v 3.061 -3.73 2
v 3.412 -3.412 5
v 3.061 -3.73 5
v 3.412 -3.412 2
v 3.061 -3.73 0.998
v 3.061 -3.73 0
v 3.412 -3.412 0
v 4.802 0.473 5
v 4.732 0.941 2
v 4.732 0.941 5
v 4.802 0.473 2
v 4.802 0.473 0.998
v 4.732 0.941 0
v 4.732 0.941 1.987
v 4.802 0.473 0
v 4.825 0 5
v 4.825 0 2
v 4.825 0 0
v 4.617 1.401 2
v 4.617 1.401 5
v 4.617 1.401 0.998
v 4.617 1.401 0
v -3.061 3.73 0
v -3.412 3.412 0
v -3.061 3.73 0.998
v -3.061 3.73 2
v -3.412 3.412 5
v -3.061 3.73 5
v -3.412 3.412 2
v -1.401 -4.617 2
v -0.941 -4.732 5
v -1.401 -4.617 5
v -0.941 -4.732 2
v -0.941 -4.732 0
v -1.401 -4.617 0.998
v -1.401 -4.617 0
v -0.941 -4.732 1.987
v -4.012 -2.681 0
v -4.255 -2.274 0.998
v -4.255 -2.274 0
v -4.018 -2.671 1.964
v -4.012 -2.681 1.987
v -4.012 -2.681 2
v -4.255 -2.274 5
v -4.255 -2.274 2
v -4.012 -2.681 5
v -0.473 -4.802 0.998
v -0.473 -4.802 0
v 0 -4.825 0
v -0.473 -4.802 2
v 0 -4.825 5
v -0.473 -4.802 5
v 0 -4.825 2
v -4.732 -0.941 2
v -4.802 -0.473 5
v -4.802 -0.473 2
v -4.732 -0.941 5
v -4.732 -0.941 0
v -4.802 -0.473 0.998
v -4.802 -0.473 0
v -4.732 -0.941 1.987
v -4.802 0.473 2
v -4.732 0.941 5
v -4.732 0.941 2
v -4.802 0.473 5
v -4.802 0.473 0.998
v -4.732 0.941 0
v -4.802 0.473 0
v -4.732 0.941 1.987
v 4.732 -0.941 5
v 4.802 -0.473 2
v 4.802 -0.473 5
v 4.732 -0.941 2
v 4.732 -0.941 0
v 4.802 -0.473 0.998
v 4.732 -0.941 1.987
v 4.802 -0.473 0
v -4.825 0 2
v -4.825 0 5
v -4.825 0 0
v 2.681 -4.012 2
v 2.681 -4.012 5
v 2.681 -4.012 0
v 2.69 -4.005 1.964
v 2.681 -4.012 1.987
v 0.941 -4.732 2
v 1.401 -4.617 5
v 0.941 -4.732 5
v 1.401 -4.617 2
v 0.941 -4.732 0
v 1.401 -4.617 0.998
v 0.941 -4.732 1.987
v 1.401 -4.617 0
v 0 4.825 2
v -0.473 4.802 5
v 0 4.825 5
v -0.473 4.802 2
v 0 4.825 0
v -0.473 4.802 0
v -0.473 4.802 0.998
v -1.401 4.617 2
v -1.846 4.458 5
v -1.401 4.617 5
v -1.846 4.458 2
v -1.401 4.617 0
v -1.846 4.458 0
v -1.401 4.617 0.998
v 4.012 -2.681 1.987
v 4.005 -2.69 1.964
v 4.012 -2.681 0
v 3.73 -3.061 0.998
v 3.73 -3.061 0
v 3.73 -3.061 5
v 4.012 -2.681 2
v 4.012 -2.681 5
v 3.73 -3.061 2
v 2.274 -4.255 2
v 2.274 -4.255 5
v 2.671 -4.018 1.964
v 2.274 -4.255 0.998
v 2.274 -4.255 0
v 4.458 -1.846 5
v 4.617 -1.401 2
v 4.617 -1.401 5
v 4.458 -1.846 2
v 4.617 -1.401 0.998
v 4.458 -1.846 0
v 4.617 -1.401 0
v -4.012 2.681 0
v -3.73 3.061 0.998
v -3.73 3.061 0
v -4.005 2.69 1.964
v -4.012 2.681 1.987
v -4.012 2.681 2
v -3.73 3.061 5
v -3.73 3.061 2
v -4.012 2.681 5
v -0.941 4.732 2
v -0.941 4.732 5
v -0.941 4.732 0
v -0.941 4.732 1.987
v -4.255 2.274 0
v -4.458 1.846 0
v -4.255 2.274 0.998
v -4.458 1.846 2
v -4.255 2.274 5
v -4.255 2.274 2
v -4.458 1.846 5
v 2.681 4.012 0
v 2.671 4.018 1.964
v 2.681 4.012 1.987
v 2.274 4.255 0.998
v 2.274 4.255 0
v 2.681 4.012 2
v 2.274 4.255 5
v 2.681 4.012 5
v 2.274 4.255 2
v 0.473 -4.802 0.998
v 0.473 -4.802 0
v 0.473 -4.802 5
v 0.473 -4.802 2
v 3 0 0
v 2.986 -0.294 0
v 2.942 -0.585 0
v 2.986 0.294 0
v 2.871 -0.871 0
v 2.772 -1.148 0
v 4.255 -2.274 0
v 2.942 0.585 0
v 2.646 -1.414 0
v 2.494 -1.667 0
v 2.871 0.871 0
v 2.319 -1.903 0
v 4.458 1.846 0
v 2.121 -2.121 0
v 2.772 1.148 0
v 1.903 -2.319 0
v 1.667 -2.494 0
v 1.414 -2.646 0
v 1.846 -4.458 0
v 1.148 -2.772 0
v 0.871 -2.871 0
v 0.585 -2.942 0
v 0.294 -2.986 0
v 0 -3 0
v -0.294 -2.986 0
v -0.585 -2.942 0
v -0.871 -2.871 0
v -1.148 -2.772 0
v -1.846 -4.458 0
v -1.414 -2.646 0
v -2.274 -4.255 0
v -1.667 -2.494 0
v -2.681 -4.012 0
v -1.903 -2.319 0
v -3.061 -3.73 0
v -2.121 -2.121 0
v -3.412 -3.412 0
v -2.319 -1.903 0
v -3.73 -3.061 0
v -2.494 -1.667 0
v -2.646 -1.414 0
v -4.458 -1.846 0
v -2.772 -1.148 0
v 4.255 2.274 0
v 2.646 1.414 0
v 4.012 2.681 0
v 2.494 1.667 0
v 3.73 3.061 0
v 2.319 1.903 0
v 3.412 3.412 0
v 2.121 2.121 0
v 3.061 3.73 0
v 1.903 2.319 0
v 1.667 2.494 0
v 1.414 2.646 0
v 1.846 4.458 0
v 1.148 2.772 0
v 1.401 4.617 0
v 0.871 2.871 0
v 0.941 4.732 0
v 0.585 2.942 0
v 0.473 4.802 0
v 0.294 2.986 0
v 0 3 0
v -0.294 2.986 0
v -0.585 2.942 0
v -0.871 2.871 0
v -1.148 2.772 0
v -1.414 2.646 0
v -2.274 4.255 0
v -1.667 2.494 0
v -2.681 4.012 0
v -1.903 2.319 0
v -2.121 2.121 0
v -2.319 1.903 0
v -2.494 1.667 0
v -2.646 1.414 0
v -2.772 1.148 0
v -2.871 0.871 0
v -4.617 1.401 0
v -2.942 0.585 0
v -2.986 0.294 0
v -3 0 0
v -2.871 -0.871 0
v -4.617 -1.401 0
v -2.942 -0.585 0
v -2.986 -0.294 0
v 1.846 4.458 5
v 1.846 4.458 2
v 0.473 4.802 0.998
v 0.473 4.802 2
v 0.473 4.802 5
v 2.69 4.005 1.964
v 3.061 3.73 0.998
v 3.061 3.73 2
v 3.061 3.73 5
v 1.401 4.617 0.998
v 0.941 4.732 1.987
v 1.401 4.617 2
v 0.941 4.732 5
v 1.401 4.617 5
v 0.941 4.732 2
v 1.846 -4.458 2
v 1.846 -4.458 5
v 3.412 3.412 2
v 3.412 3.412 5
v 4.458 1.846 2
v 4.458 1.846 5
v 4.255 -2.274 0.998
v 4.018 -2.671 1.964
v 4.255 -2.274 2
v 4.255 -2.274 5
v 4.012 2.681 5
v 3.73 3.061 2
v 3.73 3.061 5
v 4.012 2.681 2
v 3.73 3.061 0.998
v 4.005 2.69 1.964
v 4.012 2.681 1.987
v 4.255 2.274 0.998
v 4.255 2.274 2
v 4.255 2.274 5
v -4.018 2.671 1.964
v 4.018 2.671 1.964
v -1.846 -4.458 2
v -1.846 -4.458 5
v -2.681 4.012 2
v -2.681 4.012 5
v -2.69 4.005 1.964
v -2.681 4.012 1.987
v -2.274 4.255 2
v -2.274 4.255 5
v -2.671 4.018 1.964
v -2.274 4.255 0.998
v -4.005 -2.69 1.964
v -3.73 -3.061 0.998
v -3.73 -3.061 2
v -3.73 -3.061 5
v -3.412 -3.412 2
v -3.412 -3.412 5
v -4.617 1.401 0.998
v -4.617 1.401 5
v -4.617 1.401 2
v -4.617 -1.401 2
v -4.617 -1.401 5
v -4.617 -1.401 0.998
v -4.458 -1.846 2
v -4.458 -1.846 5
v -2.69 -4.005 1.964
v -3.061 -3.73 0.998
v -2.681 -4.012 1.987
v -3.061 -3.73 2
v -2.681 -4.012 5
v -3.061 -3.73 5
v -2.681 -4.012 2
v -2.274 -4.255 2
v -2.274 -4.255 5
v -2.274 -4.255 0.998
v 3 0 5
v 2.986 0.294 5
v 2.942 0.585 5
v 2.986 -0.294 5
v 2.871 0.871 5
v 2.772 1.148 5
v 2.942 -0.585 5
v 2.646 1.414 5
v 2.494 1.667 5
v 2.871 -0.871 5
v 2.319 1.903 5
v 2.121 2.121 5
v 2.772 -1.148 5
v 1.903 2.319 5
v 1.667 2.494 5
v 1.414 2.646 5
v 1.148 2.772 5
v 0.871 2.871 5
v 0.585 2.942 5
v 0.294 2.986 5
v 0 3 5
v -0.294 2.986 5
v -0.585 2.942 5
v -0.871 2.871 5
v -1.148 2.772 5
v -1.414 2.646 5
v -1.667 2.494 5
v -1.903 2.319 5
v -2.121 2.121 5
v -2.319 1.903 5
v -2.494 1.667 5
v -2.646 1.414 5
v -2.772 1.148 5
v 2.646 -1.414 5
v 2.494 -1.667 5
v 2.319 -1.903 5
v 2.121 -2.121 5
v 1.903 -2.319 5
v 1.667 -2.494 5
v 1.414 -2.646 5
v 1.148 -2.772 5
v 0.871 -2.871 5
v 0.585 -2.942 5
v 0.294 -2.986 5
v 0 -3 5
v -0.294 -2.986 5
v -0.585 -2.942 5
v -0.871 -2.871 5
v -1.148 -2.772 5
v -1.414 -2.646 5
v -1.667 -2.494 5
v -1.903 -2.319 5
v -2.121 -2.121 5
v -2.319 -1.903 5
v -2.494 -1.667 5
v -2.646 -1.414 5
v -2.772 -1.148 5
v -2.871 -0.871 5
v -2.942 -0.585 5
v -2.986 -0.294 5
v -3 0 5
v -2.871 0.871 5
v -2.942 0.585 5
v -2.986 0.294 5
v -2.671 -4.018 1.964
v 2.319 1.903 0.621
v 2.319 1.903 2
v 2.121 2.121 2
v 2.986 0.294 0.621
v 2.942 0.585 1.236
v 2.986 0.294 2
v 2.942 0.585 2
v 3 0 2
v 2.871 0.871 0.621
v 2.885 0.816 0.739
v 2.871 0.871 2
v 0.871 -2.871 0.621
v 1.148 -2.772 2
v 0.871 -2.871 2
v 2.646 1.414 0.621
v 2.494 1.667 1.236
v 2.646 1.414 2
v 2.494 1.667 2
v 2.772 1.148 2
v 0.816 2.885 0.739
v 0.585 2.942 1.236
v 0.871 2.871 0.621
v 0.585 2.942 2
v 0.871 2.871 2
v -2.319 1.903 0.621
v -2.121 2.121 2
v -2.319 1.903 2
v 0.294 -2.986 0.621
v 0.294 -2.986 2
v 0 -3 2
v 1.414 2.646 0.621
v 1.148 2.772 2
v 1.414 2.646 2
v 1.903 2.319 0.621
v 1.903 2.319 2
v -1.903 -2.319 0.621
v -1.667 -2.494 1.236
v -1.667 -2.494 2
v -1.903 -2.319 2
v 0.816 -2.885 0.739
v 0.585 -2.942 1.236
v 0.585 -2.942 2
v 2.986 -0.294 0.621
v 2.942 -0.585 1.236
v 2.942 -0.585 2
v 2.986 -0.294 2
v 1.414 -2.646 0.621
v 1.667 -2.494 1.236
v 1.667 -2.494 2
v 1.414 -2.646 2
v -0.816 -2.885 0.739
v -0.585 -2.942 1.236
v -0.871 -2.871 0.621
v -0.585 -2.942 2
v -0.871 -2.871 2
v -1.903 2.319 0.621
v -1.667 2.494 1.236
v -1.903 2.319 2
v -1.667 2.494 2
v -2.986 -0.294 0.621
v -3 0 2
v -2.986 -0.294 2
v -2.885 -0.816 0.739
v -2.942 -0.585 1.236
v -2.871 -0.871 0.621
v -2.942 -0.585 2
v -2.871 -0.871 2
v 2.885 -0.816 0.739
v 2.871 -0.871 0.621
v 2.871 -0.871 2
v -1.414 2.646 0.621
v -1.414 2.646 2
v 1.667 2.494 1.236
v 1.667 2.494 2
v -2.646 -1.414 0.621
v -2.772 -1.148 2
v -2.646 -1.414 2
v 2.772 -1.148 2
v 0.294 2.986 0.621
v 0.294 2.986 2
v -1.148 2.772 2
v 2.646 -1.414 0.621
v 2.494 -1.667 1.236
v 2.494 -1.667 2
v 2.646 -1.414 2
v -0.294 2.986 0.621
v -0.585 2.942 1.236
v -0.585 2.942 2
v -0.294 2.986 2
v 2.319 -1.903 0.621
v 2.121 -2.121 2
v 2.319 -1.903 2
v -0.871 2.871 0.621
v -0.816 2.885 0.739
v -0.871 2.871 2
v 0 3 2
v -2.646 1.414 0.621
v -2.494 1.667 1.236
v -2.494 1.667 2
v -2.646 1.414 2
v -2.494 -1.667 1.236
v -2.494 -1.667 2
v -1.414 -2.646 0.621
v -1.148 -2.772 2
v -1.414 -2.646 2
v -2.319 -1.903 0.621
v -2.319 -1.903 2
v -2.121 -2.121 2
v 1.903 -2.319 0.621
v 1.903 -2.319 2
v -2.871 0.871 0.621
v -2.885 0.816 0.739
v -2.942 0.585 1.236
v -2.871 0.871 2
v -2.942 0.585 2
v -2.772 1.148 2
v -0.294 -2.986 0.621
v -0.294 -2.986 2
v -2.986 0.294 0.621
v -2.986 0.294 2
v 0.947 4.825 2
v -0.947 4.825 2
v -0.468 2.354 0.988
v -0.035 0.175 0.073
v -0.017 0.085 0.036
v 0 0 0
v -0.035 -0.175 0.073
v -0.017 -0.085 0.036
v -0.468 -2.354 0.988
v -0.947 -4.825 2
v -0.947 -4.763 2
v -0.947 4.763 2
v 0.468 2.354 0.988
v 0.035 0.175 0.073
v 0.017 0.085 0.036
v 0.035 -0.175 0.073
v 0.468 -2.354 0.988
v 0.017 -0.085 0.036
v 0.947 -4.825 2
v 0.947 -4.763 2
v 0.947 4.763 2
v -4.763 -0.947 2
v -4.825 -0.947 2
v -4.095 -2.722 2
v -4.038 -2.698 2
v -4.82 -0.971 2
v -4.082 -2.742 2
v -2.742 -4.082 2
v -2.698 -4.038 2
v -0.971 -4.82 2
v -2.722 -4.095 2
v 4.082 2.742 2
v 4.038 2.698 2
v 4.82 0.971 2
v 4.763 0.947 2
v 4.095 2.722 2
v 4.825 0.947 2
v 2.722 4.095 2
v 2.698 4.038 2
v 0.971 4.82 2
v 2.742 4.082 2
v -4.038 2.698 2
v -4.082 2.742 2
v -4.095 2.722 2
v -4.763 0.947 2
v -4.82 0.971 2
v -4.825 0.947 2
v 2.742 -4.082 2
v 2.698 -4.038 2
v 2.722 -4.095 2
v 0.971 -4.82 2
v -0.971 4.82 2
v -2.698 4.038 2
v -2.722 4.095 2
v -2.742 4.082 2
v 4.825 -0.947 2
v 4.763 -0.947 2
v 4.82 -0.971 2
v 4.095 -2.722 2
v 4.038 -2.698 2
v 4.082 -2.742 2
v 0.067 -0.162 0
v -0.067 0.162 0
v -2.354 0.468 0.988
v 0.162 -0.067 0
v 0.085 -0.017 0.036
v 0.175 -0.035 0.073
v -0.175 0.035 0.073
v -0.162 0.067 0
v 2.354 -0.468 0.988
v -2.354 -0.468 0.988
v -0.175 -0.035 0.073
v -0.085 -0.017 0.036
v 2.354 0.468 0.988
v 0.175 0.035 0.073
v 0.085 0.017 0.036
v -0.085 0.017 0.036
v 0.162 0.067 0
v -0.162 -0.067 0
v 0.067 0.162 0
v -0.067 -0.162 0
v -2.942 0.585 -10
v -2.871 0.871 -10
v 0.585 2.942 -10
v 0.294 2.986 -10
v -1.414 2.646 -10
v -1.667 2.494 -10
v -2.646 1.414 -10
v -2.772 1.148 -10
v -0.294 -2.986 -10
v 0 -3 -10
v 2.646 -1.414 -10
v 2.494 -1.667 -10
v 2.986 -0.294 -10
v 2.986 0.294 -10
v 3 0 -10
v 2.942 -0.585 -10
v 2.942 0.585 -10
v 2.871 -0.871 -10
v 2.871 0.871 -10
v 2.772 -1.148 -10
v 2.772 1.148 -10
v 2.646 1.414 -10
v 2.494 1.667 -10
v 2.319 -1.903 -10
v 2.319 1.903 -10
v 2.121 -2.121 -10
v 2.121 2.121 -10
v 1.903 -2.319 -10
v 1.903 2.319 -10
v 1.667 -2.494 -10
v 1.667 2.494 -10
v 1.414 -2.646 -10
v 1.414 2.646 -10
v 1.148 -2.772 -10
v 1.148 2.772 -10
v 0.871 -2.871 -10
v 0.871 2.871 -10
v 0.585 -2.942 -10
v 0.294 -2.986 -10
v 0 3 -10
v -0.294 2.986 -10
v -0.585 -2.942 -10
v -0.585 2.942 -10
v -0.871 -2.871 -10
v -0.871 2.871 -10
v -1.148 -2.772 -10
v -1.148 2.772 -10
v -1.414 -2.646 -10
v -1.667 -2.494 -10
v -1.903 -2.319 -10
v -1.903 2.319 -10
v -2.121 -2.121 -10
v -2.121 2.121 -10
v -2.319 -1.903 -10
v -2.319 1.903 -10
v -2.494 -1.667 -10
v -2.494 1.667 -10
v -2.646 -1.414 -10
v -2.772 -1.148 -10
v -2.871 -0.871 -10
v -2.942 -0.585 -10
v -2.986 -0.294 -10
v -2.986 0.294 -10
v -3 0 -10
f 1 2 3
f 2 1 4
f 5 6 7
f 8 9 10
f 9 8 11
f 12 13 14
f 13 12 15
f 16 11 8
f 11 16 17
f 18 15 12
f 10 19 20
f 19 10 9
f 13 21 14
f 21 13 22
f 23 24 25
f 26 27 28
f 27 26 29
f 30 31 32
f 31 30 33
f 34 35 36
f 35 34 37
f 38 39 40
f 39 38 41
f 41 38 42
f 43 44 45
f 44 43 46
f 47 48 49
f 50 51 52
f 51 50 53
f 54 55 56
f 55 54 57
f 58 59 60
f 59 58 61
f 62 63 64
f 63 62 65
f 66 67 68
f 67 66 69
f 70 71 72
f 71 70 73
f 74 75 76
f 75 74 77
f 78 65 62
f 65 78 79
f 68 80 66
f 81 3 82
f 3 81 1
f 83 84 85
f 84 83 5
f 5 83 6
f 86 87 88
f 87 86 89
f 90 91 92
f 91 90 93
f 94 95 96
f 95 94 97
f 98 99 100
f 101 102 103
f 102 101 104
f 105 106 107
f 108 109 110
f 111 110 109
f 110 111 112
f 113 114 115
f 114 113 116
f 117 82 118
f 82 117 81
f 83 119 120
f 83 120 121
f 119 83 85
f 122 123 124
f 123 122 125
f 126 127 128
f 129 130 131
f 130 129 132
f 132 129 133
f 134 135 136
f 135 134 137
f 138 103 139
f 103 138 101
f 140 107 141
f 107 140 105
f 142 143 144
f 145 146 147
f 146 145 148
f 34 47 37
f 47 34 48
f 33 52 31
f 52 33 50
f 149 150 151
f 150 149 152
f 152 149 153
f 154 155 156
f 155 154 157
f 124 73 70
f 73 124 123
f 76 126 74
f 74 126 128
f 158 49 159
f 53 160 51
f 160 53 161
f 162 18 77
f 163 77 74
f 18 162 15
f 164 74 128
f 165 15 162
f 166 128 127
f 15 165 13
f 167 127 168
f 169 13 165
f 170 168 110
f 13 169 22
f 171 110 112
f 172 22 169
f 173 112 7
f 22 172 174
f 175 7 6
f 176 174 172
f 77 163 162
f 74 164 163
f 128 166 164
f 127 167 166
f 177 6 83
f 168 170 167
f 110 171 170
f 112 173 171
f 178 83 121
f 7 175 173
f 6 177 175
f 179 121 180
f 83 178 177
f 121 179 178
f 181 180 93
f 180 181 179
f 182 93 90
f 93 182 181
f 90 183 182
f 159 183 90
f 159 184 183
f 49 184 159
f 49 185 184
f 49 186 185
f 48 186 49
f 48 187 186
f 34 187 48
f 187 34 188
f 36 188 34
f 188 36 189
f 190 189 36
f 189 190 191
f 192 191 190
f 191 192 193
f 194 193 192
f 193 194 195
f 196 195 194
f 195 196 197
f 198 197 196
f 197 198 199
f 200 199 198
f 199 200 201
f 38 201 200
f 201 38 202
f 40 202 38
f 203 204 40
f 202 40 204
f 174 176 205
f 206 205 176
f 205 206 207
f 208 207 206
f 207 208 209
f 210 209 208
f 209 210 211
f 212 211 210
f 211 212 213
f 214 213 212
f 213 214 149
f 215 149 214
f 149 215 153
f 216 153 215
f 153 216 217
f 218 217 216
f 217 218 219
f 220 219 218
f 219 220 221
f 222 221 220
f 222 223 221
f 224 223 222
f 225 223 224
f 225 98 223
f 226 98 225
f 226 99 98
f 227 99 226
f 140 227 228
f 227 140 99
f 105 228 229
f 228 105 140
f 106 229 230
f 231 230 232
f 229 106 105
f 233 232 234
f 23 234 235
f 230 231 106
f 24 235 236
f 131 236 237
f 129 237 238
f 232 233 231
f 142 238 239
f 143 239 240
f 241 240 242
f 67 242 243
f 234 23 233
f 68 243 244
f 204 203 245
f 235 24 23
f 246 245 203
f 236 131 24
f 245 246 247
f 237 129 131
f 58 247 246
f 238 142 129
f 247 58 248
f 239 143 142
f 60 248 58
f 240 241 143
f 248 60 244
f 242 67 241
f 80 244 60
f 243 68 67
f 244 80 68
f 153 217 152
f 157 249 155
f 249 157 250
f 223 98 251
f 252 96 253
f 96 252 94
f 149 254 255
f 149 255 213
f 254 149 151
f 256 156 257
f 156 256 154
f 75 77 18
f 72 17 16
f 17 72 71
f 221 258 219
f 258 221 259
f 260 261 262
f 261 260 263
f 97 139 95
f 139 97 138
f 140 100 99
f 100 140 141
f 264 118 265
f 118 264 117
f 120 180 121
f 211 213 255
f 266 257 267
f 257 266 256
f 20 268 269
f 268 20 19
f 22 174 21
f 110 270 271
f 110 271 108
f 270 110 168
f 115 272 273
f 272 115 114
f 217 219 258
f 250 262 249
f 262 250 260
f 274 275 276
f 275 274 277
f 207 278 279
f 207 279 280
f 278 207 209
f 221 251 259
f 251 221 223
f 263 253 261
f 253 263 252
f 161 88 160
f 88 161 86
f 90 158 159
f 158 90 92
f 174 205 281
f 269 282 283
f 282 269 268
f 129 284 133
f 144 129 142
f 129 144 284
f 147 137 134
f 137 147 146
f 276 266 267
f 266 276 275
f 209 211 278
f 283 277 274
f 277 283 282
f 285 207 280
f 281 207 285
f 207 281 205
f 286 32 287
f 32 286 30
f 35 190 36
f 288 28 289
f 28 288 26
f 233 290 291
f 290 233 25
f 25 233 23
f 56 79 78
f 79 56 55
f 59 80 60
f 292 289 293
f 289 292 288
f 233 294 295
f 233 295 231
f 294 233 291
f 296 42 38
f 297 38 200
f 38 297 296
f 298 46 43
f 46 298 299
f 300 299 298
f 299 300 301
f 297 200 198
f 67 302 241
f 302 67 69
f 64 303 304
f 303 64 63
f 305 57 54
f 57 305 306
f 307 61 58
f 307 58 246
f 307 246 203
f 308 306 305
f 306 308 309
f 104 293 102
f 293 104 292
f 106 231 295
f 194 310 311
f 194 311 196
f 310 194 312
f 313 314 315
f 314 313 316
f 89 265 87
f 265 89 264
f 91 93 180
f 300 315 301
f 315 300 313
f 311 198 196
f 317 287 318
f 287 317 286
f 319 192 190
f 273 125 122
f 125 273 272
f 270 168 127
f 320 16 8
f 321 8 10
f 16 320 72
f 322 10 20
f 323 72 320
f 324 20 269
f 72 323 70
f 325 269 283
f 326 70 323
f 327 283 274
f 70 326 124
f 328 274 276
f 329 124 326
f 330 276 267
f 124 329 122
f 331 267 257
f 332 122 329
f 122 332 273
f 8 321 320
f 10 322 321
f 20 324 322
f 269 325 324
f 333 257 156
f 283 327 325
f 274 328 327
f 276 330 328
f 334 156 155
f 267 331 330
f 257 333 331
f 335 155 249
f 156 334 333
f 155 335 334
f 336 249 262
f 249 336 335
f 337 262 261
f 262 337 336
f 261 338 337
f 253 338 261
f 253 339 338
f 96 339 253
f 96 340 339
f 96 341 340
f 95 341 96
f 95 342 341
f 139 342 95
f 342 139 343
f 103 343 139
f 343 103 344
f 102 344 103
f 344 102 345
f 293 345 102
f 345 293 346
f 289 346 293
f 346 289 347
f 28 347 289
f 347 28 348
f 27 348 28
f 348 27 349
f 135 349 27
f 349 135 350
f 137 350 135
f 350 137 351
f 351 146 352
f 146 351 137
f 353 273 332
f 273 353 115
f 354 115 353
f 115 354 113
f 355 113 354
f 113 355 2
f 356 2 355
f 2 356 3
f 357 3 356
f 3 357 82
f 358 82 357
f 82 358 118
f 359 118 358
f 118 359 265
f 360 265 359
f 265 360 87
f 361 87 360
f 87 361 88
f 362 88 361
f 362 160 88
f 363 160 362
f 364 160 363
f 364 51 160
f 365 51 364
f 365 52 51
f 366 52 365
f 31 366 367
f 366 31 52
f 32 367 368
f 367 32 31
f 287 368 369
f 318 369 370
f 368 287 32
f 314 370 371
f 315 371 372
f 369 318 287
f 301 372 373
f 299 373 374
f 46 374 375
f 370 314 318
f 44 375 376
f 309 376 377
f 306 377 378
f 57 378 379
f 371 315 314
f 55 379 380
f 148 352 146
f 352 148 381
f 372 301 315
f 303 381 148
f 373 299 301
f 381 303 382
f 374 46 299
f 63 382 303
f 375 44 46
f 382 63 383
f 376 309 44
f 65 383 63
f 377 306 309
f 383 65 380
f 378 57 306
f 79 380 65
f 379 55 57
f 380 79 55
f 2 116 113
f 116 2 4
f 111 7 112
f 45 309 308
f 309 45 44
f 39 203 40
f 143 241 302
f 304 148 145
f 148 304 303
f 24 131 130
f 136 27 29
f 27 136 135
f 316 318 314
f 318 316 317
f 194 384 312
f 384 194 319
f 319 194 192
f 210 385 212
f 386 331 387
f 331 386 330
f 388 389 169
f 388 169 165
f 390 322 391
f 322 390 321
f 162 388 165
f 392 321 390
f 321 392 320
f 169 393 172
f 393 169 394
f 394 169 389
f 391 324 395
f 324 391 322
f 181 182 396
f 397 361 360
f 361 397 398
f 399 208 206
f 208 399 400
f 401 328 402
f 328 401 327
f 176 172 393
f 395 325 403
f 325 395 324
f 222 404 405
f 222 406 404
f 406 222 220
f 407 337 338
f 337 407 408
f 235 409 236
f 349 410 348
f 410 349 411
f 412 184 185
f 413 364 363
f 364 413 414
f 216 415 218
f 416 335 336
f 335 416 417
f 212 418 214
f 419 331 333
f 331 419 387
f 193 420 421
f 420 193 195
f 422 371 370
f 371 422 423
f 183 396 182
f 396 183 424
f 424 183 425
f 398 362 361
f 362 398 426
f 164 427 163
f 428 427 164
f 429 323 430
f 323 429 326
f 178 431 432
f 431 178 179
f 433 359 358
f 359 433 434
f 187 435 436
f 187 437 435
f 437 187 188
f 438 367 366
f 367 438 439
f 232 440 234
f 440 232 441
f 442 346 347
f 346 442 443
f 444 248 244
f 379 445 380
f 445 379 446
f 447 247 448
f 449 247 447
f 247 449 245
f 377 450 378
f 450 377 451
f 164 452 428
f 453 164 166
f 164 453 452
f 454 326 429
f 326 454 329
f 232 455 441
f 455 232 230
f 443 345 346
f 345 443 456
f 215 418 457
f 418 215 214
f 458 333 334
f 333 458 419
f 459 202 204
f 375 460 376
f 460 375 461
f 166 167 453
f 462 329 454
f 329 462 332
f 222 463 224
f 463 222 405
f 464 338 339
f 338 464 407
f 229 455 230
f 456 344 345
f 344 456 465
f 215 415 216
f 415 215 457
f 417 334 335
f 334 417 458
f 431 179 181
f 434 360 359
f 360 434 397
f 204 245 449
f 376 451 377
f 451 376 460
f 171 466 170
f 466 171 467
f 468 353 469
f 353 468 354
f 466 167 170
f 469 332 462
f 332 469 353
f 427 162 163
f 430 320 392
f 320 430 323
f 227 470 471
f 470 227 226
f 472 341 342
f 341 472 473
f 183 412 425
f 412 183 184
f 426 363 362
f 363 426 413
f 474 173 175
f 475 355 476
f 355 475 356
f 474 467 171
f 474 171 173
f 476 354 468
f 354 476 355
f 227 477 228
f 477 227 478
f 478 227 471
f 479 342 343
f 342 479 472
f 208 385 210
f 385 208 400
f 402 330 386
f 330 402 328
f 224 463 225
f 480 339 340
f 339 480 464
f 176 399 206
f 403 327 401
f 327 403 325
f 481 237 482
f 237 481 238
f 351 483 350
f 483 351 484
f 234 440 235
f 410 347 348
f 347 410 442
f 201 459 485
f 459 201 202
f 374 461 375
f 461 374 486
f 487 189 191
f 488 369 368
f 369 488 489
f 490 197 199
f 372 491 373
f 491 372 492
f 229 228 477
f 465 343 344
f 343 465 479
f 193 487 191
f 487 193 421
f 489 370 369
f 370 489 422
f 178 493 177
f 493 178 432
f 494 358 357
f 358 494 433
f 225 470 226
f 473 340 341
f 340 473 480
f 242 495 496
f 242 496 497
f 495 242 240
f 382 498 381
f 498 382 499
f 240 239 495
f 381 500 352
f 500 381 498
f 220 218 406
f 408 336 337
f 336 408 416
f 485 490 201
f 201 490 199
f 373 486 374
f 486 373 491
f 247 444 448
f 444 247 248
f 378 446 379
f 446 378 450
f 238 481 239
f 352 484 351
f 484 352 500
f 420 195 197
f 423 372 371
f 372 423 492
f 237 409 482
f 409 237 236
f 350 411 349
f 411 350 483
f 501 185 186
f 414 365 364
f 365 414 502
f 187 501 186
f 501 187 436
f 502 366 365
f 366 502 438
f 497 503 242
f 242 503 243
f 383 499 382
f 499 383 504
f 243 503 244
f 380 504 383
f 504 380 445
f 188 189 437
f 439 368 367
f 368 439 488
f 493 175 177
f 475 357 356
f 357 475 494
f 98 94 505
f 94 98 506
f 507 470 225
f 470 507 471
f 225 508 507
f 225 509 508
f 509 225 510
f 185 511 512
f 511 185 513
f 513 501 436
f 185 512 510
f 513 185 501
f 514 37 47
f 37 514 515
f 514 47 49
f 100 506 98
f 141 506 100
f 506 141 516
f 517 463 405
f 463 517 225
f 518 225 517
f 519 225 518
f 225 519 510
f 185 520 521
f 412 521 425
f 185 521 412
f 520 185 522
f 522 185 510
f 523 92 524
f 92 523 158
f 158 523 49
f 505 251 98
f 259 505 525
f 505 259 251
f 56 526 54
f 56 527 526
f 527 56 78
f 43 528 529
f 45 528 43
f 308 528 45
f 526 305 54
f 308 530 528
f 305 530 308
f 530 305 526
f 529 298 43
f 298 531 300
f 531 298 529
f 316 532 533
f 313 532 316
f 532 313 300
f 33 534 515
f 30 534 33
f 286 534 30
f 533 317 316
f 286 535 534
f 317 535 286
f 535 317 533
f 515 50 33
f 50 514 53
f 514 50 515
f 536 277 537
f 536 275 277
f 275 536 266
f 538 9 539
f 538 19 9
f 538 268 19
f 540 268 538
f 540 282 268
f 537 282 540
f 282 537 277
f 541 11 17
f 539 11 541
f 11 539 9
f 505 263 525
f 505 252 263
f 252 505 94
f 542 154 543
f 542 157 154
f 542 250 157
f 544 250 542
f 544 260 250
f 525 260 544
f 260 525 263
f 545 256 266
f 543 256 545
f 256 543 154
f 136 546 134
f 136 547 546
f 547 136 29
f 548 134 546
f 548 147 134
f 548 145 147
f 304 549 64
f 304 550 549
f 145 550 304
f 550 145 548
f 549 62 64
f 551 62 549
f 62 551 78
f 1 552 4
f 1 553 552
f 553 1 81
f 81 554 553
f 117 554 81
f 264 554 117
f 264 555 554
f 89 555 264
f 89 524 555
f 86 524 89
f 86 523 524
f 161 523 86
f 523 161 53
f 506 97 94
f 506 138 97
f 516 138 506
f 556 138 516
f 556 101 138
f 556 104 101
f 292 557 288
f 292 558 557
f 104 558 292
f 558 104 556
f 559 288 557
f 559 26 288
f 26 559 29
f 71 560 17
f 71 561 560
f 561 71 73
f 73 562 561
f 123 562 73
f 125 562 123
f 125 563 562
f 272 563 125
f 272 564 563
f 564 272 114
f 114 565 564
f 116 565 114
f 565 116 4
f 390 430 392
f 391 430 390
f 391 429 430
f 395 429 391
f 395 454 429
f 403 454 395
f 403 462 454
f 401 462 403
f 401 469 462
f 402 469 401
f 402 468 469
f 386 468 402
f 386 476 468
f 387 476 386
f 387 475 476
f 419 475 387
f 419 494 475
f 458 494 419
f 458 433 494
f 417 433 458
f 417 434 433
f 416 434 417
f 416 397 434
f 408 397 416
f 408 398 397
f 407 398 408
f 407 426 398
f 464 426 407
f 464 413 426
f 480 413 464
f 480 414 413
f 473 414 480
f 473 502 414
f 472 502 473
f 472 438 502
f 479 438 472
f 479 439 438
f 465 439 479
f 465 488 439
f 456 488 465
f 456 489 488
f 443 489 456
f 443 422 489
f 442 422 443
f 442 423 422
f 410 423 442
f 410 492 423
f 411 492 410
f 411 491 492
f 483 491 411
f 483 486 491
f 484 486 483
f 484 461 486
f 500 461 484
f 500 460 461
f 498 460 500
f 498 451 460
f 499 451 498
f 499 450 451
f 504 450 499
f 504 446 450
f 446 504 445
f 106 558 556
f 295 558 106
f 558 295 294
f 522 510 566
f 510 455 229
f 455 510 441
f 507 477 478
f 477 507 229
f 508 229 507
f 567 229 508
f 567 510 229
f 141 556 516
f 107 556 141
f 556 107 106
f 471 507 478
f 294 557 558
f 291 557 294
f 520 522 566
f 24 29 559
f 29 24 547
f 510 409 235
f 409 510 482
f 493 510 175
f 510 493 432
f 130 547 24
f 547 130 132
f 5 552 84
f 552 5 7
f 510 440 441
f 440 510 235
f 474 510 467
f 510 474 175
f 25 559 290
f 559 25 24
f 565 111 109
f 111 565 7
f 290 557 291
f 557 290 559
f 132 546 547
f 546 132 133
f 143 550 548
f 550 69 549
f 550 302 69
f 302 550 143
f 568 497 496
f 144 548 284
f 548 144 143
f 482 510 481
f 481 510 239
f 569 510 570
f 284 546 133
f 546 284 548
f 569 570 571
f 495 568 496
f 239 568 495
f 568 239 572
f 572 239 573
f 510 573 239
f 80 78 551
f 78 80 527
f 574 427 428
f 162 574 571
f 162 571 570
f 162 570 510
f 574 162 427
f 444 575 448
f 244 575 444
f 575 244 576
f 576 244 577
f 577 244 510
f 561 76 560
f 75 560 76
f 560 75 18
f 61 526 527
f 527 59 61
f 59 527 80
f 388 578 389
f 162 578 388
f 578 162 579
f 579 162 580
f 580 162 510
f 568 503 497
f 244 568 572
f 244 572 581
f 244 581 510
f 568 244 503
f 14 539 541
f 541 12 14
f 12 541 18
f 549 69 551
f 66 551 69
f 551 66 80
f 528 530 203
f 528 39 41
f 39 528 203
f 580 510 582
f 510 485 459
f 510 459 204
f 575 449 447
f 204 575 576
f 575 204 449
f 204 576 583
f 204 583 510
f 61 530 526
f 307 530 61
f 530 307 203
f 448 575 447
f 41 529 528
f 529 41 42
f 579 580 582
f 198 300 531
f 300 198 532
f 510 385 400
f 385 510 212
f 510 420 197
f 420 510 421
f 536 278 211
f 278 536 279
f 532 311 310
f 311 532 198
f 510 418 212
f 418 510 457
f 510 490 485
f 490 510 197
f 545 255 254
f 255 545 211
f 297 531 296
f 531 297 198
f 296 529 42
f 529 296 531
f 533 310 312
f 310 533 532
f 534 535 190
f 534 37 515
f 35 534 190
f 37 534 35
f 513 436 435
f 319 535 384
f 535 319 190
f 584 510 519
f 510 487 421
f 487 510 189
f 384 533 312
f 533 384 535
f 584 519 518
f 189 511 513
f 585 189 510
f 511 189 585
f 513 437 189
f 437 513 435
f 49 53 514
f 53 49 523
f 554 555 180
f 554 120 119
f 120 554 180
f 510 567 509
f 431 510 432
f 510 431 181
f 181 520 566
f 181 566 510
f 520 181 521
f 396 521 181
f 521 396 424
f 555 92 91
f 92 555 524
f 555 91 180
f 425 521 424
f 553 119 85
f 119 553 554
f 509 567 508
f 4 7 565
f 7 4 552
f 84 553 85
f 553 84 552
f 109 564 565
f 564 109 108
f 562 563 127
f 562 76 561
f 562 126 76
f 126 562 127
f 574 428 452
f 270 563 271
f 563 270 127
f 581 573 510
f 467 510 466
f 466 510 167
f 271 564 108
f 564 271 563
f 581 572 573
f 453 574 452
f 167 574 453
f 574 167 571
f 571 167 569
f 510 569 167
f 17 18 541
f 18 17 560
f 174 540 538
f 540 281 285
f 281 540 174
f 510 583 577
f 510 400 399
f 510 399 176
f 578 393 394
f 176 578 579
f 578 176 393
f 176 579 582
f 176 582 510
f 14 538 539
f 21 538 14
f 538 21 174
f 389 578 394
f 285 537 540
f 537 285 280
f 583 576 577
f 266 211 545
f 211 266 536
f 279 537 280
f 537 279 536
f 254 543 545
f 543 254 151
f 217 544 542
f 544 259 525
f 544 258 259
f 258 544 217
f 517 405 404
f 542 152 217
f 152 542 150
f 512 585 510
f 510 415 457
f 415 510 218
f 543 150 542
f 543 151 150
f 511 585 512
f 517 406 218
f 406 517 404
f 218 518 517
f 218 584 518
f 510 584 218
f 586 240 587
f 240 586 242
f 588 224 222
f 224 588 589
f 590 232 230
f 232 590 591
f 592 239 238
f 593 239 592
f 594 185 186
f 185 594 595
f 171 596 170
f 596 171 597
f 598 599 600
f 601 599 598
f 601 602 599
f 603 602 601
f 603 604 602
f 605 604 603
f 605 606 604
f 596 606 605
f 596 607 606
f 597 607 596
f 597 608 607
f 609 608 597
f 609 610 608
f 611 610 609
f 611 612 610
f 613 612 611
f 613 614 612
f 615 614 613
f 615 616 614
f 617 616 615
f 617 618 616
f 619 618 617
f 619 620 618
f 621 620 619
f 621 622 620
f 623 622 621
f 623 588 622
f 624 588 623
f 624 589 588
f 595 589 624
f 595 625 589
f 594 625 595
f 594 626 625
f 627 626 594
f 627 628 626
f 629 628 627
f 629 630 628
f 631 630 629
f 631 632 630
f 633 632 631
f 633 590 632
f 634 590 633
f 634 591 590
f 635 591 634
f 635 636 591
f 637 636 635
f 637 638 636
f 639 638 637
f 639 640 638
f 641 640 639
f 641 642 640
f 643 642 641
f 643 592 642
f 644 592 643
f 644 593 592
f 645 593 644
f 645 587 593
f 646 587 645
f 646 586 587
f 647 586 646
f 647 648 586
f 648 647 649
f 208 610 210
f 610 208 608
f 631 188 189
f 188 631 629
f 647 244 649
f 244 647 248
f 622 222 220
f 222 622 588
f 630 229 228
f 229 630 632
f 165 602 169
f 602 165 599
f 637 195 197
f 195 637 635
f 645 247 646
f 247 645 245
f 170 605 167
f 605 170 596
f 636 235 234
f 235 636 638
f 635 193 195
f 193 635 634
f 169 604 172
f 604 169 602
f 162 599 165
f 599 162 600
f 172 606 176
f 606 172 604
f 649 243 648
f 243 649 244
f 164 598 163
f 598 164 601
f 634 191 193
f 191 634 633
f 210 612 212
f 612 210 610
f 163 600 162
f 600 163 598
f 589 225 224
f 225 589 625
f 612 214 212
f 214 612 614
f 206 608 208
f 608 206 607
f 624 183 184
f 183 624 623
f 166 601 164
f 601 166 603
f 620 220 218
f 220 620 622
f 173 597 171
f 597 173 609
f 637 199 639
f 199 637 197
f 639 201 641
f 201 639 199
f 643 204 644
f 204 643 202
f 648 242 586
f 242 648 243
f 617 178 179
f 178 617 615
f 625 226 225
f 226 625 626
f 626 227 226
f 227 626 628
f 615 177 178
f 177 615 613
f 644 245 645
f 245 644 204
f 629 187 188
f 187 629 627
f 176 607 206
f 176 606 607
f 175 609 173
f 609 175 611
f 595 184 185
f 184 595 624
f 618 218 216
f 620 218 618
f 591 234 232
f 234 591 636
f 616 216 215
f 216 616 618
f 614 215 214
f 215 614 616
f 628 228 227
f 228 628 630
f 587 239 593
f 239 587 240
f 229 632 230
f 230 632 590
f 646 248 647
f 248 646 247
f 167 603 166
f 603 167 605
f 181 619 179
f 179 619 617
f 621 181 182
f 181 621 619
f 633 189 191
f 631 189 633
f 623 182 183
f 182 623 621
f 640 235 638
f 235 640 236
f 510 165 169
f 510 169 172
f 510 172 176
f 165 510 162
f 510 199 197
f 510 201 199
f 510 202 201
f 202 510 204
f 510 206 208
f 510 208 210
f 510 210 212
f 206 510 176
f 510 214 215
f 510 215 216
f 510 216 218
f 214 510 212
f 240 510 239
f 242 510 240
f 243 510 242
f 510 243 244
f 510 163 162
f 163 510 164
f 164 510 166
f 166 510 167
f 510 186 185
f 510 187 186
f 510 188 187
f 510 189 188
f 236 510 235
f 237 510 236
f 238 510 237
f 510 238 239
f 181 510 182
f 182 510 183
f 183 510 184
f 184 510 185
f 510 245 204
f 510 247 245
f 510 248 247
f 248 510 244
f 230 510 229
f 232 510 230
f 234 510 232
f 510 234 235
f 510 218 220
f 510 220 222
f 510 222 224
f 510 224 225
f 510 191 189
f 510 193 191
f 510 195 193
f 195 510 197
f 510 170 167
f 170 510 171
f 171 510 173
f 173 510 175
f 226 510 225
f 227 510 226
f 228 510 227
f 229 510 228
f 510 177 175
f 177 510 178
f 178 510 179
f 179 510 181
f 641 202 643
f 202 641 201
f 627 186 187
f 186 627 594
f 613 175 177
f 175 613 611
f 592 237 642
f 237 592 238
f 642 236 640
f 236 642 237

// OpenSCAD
module timing_pulley(teeth=16, pitch_diameter=9.65, belt_width=5, hub_diameter=6, hub_height=10) {
    tooth_height = 2;
    tooth_width = pitch_diameter * PI / teeth;
    pulley_radius = pitch_diameter / 2;
    
    module tooth() {
        translate([0, pulley_radius, 0])
        rotate([90, 0, 0])
        linear_extrude(height=belt_width)
        polygon(points=[[0, 0], [tooth_width / 2, tooth_height], [-tooth_width / 2, tooth_height]]);
    }
    
    module pulley_body() {
        difference() {
            cylinder(h=belt_width, r=pulley_radius, $fn=64);
            translate([0, 0, -1])
            cylinder(h=belt_width + 2, r=hub_diameter / 2, $fn=64);
        }
    }
    
    module hub() {
        translate([0, 0, -hub_height])
        cylinder(h=hub_height, r=hub_diameter / 2, $fn=64);
    }
    
    union() {
        pulley_body();
        hub();
        for (i = [0:teeth-1]) {
            rotate([0, 0, i * 360 / teeth])
            tooth();
        }
    }
}

timing_pulley();
